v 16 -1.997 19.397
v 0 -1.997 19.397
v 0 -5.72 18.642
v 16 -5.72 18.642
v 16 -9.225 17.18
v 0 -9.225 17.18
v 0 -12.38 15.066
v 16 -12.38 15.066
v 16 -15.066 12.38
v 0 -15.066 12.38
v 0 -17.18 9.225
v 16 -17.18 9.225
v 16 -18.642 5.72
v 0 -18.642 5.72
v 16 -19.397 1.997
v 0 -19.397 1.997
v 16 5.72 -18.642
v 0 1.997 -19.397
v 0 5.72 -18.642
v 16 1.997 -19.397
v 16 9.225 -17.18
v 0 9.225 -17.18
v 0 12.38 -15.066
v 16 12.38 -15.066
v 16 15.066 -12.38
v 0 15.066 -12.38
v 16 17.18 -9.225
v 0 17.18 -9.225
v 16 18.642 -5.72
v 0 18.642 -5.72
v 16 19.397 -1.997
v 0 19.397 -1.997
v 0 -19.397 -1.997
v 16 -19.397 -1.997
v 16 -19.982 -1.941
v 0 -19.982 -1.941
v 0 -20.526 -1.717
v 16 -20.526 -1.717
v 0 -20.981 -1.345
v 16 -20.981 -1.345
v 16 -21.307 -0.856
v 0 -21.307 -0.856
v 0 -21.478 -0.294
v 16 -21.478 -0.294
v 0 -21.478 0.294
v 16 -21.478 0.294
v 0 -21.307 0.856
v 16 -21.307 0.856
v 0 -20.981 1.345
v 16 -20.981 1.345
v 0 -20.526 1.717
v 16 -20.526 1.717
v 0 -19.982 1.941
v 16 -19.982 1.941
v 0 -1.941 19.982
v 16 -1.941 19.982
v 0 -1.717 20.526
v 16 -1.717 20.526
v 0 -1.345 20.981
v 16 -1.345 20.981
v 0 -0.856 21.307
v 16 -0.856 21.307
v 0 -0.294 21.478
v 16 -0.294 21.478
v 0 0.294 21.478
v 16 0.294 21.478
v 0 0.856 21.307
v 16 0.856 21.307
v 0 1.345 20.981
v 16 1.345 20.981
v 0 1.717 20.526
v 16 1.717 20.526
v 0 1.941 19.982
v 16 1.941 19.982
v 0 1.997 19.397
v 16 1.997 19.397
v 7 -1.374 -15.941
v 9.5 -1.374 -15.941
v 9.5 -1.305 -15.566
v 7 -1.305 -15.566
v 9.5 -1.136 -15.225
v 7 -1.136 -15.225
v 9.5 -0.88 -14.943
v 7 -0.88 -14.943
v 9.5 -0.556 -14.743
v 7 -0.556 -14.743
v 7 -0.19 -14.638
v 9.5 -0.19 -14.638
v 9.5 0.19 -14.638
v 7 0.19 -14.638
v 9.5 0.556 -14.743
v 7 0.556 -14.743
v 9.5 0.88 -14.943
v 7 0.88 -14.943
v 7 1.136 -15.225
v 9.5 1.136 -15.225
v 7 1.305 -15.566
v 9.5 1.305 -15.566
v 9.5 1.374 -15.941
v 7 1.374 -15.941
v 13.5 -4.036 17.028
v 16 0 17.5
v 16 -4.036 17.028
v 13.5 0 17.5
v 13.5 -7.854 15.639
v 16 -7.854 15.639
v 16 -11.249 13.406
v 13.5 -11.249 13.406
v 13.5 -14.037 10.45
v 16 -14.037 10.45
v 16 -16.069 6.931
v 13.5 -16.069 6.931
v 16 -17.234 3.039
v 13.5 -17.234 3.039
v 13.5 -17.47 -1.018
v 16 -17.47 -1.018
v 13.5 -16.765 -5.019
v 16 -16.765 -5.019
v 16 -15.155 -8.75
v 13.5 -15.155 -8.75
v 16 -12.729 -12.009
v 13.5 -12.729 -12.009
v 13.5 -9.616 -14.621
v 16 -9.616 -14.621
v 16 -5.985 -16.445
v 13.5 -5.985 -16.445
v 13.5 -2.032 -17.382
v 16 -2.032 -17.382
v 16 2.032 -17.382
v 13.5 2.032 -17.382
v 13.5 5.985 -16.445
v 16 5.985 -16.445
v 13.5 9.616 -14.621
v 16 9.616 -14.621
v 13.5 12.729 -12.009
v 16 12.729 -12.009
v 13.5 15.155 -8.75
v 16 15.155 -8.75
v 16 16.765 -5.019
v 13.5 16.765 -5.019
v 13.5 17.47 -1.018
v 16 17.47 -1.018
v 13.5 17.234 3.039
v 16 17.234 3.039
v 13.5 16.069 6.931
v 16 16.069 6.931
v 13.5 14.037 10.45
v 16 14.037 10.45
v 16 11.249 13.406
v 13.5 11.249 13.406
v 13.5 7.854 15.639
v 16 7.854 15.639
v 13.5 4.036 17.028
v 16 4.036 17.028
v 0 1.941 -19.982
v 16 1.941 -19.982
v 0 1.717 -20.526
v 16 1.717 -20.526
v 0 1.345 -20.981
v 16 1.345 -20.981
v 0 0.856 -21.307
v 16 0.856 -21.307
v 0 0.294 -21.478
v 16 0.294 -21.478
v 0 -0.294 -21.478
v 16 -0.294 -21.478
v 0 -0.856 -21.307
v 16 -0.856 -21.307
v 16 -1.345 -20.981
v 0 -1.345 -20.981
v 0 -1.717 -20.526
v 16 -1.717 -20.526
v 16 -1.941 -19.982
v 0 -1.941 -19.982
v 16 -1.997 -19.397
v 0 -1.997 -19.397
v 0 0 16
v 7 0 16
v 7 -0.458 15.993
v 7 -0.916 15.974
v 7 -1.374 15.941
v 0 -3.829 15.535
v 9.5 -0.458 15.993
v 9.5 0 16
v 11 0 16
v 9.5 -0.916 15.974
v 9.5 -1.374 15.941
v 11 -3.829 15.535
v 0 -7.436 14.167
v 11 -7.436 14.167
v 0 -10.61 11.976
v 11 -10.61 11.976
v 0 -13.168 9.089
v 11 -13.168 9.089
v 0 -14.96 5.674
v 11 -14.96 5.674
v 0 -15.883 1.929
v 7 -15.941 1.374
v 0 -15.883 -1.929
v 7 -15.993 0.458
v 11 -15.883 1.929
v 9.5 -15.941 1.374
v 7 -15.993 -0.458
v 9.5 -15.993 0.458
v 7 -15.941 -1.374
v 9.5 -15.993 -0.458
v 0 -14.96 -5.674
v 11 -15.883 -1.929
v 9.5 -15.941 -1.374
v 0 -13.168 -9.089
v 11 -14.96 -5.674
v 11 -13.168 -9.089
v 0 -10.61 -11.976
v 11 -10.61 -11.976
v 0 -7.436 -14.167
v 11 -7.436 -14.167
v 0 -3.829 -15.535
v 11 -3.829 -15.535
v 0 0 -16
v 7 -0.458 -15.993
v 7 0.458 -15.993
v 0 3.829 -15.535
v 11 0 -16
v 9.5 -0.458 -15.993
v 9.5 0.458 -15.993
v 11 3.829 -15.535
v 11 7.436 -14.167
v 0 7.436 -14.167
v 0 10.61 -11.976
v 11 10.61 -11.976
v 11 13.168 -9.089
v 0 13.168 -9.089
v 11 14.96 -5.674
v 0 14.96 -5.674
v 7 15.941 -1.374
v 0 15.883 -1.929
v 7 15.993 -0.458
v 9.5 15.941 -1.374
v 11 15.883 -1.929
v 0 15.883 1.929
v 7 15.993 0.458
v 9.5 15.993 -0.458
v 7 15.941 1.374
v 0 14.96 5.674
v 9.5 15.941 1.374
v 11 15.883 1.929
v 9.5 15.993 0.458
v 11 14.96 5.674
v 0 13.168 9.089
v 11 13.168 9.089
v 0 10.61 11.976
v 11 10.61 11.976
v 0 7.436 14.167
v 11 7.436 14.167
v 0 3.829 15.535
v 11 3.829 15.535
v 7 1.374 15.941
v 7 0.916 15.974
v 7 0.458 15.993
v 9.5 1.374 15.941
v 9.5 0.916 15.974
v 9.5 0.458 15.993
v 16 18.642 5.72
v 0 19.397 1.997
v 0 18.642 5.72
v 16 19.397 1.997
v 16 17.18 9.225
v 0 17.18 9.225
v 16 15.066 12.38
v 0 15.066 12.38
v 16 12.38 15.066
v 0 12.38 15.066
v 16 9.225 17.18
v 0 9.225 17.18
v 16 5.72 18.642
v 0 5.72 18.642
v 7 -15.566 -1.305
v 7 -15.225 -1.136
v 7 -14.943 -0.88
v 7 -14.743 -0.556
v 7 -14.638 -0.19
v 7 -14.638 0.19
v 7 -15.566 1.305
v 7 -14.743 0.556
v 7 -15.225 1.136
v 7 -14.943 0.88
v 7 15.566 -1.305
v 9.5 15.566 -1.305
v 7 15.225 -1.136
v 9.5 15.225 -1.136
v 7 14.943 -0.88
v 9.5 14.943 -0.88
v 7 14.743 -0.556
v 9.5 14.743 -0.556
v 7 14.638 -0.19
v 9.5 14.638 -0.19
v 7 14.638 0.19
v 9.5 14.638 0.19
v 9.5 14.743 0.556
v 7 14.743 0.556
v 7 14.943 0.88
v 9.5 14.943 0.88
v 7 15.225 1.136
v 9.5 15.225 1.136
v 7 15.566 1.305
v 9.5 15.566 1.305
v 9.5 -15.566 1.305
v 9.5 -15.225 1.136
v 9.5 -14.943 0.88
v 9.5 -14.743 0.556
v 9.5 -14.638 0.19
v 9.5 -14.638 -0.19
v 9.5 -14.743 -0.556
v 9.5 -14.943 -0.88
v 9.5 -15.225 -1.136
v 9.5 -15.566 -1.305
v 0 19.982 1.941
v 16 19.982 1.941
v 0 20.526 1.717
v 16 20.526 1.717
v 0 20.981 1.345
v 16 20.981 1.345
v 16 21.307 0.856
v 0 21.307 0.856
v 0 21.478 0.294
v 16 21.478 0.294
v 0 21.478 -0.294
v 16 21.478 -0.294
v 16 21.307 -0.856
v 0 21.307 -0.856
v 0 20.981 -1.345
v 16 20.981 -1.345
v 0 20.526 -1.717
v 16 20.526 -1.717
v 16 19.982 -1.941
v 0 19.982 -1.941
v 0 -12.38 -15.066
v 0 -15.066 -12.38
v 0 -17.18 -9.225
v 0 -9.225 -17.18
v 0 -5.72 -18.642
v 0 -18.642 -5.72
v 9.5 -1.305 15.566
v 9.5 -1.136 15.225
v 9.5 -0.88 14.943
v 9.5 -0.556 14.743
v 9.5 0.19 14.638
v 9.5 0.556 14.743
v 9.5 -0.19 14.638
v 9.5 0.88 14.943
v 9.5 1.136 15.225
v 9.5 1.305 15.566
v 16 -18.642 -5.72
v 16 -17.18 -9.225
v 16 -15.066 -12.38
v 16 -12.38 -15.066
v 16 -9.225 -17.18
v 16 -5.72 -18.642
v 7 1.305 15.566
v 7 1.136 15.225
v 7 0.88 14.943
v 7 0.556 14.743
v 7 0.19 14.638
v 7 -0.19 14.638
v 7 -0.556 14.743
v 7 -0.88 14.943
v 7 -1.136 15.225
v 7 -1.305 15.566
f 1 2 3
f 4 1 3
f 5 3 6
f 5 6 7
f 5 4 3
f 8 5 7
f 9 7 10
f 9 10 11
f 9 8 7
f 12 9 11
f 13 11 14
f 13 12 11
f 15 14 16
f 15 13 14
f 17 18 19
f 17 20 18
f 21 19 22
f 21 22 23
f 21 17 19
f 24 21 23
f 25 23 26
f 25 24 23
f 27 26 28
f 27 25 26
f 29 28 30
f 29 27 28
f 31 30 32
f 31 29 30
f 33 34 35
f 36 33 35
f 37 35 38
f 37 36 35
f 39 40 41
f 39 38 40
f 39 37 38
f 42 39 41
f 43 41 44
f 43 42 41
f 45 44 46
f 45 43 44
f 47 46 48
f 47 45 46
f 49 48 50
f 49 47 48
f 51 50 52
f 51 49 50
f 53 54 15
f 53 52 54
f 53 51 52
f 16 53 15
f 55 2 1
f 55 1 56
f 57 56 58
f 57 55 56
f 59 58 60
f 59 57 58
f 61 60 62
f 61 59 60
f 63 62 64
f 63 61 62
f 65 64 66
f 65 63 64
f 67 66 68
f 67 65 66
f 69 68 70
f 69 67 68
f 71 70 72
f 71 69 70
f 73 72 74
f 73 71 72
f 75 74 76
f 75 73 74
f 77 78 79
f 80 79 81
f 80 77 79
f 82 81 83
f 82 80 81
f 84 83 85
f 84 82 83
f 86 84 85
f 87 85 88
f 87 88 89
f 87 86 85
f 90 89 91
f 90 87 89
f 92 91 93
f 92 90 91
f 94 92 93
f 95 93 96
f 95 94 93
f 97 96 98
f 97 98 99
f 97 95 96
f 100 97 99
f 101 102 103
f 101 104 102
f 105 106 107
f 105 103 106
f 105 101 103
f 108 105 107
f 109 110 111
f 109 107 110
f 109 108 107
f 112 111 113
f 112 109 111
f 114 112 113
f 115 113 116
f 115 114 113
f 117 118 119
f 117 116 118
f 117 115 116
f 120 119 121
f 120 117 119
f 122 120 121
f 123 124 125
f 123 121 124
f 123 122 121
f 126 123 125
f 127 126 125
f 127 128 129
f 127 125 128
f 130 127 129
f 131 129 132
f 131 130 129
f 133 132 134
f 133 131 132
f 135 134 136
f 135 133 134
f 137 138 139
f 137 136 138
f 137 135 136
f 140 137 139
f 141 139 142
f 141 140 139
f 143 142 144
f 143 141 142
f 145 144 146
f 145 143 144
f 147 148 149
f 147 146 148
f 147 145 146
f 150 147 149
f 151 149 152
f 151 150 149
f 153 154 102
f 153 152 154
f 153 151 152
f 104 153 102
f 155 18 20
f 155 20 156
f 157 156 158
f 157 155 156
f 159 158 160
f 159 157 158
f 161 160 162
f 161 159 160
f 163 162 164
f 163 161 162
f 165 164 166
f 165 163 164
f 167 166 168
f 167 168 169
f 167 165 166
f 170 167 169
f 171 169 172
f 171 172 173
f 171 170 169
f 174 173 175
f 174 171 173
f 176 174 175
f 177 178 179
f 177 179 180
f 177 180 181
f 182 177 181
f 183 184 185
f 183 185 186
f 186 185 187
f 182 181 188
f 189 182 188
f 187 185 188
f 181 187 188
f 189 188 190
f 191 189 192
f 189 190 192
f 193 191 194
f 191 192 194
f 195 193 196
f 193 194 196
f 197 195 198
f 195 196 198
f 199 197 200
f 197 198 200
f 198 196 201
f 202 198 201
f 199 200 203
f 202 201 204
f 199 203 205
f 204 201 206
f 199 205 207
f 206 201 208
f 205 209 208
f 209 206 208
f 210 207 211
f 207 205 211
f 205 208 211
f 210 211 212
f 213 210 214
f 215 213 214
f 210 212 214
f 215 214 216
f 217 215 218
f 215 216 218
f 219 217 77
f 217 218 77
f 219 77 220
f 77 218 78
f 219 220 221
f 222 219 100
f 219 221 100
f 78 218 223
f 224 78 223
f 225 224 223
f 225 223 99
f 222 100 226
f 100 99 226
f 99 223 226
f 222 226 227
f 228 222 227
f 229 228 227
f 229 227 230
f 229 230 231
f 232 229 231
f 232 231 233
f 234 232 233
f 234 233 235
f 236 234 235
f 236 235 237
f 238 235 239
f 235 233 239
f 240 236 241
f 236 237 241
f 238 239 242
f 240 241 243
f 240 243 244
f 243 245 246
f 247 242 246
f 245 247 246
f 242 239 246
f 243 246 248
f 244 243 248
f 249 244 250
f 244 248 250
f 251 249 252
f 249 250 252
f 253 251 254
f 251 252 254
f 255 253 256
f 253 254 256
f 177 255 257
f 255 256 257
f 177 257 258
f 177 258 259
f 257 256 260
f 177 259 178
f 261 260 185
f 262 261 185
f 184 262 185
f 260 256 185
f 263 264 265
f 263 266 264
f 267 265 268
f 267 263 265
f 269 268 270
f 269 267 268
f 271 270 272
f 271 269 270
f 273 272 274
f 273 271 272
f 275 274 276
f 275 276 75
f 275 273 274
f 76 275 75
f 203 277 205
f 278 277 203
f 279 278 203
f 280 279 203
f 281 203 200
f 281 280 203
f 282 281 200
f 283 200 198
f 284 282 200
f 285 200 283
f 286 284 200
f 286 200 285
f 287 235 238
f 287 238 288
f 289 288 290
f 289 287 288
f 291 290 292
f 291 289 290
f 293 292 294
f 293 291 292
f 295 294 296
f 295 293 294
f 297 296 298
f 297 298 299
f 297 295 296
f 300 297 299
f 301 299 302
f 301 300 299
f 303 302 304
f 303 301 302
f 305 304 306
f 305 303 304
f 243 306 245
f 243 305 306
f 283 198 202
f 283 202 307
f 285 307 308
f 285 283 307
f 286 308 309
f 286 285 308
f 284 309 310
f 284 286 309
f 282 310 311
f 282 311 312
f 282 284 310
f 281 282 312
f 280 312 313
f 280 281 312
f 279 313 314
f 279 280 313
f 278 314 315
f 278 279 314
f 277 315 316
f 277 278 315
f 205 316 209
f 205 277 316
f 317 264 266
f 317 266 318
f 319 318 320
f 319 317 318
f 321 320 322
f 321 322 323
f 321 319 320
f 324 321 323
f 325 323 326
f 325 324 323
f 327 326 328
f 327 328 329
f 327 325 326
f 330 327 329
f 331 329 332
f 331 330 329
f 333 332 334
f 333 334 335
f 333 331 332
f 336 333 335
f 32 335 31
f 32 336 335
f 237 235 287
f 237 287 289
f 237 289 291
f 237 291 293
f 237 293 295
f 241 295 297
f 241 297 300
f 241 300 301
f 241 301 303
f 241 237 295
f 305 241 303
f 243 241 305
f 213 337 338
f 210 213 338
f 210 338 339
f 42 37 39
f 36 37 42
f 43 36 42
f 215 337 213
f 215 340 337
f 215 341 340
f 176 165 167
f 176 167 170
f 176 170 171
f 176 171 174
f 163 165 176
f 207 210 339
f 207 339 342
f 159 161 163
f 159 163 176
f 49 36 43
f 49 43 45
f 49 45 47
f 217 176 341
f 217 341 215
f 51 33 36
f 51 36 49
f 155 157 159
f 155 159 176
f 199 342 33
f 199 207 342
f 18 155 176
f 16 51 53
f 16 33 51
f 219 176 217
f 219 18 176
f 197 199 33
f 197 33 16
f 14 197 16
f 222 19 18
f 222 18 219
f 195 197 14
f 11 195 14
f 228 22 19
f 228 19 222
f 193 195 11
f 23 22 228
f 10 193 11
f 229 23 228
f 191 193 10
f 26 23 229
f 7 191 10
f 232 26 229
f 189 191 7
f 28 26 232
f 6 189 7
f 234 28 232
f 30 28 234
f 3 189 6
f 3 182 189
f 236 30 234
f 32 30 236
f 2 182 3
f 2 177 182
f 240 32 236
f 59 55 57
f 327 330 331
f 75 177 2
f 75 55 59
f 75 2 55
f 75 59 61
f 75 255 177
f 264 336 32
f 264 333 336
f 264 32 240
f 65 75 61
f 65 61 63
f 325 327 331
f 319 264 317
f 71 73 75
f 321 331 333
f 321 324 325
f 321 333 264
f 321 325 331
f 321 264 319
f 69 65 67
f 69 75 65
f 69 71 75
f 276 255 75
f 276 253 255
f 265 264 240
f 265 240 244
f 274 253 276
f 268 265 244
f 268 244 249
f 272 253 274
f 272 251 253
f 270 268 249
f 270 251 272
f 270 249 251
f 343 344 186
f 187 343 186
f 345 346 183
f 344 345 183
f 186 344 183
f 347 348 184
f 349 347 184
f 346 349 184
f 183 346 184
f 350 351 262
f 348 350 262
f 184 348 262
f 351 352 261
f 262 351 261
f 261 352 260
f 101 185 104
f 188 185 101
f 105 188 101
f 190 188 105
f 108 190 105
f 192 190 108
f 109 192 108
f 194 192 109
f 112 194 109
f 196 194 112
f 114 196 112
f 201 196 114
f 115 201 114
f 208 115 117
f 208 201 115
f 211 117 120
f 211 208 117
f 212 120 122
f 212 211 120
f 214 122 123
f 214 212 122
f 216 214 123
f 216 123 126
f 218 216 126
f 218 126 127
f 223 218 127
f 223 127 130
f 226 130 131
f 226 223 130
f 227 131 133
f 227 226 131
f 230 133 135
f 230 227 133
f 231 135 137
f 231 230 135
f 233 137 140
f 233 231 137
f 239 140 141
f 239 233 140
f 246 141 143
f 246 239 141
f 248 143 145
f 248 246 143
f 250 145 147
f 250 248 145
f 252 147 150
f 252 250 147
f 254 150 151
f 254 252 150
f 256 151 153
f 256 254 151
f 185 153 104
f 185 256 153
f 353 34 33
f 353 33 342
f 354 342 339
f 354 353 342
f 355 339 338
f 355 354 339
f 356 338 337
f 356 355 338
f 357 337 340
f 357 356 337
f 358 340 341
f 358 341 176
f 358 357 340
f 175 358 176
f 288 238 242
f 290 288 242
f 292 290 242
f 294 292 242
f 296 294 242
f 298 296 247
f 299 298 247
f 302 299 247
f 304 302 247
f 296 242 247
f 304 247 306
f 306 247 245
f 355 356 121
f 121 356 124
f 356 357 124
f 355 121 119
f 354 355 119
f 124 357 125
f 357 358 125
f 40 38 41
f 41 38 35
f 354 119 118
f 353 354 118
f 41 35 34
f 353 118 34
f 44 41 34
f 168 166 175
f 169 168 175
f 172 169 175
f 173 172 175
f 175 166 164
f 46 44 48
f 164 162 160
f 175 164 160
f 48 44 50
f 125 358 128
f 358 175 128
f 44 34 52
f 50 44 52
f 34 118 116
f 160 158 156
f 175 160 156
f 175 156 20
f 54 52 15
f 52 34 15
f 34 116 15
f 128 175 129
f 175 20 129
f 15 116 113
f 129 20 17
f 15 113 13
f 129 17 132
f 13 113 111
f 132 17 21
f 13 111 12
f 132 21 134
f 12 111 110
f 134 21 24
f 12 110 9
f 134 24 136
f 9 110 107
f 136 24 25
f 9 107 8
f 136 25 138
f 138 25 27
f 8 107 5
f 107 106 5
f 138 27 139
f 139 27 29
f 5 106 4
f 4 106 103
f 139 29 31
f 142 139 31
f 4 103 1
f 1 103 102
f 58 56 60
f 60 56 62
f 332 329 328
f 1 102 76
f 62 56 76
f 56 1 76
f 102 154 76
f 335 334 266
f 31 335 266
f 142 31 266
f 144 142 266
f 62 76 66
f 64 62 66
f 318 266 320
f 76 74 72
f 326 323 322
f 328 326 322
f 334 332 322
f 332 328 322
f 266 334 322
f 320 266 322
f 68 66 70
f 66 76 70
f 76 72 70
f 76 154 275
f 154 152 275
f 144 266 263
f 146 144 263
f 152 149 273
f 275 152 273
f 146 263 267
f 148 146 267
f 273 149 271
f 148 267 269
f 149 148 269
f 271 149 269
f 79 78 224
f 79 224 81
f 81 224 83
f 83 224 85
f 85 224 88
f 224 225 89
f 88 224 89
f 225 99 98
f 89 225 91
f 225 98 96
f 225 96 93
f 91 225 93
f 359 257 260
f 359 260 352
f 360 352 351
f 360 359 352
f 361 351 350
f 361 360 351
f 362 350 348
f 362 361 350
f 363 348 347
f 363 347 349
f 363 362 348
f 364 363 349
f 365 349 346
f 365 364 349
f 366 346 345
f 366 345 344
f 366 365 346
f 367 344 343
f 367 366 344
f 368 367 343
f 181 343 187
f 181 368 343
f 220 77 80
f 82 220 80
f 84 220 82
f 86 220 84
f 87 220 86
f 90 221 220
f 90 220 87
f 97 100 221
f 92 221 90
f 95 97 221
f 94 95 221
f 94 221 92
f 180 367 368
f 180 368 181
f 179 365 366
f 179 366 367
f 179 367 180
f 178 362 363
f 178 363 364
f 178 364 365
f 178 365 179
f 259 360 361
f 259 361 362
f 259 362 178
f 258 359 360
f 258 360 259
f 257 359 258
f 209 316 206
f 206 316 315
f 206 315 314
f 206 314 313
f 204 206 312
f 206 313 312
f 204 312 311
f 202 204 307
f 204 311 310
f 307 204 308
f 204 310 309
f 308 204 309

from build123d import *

# Parameters (mm, degrees)
SKETCH1_W           = 16
SKETCH1_H           = 3.5
BOSS_EXTRUDE1_START = -7
SKETCH3_R           = 1.375
BOSS_EXTRUDE1_DEPTH = 2.5
SKETCH4_R           = 2
BOSS_EXTRUDE2_DEPTH = 16


with BuildPart() as part:
    # Sketch1 → Revolve1 (revolve)
    with BuildSketch(Plane(origin=(0, 0, 0), x_dir=(1, 0, 0), z_dir=(0, 1, 0)), mode=Mode.PRIVATE) as revolve1_sk:
        with Locations((8, 17.75)):
            Rectangle(SKETCH1_W, SKETCH1_H)
    revolve(revolve1_sk.sketch.rotate(Axis((0, 0, 0), (1, 0, 0)), 180), axis=Axis((0, 0, 0), (1, 0, 0)))

    # Sketch2 → Cut-Revolve1 (revolve, cut)
    with BuildSketch(Plane(origin=(0, 0, 0), x_dir=(1, 0, 0), z_dir=(0, 1, 0)), mode=Mode.PRIVATE) as cut_revolve1_sk:
        Polygon((16, 17.5), (13.5, 17.5), (11, 16), (16, 16), align=None)
    revolve(cut_revolve1_sk.sketch.rotate(Axis((0, 0, 0), (1, 0, 0)), 180), axis=Axis((0, 0, 0), (1, 0, 0)), mode=Mode.SUBTRACT)

    # Sketch3 → Boss-Extrude1 (add)
    with BuildSketch(Plane.ZY.offset(BOSS_EXTRUDE1_START)):
        with Locations((0, 16)):
            Circle(SKETCH3_R)
        with Locations((16, 0)):
            Circle(SKETCH3_R)
        with Locations((0, -16)):
            Circle(SKETCH3_R)
        with Locations((-16, 0)):
            Circle(SKETCH3_R)
    extrude(amount=-BOSS_EXTRUDE1_DEPTH)

    # Sketch4 → Boss-Extrude2 (add)
    with BuildSketch(Plane.ZY):
        with Locations((0, 19.5)):
            Circle(SKETCH4_R)
        with Locations((19.5, 0)):
            Circle(SKETCH4_R)
        with Locations((0, -19.5)):
            Circle(SKETCH4_R)
        with Locations((-19.5, 0)):
            Circle(SKETCH4_R)
    extrude(amount=-BOSS_EXTRUDE2_DEPTH)


solid = part.part
